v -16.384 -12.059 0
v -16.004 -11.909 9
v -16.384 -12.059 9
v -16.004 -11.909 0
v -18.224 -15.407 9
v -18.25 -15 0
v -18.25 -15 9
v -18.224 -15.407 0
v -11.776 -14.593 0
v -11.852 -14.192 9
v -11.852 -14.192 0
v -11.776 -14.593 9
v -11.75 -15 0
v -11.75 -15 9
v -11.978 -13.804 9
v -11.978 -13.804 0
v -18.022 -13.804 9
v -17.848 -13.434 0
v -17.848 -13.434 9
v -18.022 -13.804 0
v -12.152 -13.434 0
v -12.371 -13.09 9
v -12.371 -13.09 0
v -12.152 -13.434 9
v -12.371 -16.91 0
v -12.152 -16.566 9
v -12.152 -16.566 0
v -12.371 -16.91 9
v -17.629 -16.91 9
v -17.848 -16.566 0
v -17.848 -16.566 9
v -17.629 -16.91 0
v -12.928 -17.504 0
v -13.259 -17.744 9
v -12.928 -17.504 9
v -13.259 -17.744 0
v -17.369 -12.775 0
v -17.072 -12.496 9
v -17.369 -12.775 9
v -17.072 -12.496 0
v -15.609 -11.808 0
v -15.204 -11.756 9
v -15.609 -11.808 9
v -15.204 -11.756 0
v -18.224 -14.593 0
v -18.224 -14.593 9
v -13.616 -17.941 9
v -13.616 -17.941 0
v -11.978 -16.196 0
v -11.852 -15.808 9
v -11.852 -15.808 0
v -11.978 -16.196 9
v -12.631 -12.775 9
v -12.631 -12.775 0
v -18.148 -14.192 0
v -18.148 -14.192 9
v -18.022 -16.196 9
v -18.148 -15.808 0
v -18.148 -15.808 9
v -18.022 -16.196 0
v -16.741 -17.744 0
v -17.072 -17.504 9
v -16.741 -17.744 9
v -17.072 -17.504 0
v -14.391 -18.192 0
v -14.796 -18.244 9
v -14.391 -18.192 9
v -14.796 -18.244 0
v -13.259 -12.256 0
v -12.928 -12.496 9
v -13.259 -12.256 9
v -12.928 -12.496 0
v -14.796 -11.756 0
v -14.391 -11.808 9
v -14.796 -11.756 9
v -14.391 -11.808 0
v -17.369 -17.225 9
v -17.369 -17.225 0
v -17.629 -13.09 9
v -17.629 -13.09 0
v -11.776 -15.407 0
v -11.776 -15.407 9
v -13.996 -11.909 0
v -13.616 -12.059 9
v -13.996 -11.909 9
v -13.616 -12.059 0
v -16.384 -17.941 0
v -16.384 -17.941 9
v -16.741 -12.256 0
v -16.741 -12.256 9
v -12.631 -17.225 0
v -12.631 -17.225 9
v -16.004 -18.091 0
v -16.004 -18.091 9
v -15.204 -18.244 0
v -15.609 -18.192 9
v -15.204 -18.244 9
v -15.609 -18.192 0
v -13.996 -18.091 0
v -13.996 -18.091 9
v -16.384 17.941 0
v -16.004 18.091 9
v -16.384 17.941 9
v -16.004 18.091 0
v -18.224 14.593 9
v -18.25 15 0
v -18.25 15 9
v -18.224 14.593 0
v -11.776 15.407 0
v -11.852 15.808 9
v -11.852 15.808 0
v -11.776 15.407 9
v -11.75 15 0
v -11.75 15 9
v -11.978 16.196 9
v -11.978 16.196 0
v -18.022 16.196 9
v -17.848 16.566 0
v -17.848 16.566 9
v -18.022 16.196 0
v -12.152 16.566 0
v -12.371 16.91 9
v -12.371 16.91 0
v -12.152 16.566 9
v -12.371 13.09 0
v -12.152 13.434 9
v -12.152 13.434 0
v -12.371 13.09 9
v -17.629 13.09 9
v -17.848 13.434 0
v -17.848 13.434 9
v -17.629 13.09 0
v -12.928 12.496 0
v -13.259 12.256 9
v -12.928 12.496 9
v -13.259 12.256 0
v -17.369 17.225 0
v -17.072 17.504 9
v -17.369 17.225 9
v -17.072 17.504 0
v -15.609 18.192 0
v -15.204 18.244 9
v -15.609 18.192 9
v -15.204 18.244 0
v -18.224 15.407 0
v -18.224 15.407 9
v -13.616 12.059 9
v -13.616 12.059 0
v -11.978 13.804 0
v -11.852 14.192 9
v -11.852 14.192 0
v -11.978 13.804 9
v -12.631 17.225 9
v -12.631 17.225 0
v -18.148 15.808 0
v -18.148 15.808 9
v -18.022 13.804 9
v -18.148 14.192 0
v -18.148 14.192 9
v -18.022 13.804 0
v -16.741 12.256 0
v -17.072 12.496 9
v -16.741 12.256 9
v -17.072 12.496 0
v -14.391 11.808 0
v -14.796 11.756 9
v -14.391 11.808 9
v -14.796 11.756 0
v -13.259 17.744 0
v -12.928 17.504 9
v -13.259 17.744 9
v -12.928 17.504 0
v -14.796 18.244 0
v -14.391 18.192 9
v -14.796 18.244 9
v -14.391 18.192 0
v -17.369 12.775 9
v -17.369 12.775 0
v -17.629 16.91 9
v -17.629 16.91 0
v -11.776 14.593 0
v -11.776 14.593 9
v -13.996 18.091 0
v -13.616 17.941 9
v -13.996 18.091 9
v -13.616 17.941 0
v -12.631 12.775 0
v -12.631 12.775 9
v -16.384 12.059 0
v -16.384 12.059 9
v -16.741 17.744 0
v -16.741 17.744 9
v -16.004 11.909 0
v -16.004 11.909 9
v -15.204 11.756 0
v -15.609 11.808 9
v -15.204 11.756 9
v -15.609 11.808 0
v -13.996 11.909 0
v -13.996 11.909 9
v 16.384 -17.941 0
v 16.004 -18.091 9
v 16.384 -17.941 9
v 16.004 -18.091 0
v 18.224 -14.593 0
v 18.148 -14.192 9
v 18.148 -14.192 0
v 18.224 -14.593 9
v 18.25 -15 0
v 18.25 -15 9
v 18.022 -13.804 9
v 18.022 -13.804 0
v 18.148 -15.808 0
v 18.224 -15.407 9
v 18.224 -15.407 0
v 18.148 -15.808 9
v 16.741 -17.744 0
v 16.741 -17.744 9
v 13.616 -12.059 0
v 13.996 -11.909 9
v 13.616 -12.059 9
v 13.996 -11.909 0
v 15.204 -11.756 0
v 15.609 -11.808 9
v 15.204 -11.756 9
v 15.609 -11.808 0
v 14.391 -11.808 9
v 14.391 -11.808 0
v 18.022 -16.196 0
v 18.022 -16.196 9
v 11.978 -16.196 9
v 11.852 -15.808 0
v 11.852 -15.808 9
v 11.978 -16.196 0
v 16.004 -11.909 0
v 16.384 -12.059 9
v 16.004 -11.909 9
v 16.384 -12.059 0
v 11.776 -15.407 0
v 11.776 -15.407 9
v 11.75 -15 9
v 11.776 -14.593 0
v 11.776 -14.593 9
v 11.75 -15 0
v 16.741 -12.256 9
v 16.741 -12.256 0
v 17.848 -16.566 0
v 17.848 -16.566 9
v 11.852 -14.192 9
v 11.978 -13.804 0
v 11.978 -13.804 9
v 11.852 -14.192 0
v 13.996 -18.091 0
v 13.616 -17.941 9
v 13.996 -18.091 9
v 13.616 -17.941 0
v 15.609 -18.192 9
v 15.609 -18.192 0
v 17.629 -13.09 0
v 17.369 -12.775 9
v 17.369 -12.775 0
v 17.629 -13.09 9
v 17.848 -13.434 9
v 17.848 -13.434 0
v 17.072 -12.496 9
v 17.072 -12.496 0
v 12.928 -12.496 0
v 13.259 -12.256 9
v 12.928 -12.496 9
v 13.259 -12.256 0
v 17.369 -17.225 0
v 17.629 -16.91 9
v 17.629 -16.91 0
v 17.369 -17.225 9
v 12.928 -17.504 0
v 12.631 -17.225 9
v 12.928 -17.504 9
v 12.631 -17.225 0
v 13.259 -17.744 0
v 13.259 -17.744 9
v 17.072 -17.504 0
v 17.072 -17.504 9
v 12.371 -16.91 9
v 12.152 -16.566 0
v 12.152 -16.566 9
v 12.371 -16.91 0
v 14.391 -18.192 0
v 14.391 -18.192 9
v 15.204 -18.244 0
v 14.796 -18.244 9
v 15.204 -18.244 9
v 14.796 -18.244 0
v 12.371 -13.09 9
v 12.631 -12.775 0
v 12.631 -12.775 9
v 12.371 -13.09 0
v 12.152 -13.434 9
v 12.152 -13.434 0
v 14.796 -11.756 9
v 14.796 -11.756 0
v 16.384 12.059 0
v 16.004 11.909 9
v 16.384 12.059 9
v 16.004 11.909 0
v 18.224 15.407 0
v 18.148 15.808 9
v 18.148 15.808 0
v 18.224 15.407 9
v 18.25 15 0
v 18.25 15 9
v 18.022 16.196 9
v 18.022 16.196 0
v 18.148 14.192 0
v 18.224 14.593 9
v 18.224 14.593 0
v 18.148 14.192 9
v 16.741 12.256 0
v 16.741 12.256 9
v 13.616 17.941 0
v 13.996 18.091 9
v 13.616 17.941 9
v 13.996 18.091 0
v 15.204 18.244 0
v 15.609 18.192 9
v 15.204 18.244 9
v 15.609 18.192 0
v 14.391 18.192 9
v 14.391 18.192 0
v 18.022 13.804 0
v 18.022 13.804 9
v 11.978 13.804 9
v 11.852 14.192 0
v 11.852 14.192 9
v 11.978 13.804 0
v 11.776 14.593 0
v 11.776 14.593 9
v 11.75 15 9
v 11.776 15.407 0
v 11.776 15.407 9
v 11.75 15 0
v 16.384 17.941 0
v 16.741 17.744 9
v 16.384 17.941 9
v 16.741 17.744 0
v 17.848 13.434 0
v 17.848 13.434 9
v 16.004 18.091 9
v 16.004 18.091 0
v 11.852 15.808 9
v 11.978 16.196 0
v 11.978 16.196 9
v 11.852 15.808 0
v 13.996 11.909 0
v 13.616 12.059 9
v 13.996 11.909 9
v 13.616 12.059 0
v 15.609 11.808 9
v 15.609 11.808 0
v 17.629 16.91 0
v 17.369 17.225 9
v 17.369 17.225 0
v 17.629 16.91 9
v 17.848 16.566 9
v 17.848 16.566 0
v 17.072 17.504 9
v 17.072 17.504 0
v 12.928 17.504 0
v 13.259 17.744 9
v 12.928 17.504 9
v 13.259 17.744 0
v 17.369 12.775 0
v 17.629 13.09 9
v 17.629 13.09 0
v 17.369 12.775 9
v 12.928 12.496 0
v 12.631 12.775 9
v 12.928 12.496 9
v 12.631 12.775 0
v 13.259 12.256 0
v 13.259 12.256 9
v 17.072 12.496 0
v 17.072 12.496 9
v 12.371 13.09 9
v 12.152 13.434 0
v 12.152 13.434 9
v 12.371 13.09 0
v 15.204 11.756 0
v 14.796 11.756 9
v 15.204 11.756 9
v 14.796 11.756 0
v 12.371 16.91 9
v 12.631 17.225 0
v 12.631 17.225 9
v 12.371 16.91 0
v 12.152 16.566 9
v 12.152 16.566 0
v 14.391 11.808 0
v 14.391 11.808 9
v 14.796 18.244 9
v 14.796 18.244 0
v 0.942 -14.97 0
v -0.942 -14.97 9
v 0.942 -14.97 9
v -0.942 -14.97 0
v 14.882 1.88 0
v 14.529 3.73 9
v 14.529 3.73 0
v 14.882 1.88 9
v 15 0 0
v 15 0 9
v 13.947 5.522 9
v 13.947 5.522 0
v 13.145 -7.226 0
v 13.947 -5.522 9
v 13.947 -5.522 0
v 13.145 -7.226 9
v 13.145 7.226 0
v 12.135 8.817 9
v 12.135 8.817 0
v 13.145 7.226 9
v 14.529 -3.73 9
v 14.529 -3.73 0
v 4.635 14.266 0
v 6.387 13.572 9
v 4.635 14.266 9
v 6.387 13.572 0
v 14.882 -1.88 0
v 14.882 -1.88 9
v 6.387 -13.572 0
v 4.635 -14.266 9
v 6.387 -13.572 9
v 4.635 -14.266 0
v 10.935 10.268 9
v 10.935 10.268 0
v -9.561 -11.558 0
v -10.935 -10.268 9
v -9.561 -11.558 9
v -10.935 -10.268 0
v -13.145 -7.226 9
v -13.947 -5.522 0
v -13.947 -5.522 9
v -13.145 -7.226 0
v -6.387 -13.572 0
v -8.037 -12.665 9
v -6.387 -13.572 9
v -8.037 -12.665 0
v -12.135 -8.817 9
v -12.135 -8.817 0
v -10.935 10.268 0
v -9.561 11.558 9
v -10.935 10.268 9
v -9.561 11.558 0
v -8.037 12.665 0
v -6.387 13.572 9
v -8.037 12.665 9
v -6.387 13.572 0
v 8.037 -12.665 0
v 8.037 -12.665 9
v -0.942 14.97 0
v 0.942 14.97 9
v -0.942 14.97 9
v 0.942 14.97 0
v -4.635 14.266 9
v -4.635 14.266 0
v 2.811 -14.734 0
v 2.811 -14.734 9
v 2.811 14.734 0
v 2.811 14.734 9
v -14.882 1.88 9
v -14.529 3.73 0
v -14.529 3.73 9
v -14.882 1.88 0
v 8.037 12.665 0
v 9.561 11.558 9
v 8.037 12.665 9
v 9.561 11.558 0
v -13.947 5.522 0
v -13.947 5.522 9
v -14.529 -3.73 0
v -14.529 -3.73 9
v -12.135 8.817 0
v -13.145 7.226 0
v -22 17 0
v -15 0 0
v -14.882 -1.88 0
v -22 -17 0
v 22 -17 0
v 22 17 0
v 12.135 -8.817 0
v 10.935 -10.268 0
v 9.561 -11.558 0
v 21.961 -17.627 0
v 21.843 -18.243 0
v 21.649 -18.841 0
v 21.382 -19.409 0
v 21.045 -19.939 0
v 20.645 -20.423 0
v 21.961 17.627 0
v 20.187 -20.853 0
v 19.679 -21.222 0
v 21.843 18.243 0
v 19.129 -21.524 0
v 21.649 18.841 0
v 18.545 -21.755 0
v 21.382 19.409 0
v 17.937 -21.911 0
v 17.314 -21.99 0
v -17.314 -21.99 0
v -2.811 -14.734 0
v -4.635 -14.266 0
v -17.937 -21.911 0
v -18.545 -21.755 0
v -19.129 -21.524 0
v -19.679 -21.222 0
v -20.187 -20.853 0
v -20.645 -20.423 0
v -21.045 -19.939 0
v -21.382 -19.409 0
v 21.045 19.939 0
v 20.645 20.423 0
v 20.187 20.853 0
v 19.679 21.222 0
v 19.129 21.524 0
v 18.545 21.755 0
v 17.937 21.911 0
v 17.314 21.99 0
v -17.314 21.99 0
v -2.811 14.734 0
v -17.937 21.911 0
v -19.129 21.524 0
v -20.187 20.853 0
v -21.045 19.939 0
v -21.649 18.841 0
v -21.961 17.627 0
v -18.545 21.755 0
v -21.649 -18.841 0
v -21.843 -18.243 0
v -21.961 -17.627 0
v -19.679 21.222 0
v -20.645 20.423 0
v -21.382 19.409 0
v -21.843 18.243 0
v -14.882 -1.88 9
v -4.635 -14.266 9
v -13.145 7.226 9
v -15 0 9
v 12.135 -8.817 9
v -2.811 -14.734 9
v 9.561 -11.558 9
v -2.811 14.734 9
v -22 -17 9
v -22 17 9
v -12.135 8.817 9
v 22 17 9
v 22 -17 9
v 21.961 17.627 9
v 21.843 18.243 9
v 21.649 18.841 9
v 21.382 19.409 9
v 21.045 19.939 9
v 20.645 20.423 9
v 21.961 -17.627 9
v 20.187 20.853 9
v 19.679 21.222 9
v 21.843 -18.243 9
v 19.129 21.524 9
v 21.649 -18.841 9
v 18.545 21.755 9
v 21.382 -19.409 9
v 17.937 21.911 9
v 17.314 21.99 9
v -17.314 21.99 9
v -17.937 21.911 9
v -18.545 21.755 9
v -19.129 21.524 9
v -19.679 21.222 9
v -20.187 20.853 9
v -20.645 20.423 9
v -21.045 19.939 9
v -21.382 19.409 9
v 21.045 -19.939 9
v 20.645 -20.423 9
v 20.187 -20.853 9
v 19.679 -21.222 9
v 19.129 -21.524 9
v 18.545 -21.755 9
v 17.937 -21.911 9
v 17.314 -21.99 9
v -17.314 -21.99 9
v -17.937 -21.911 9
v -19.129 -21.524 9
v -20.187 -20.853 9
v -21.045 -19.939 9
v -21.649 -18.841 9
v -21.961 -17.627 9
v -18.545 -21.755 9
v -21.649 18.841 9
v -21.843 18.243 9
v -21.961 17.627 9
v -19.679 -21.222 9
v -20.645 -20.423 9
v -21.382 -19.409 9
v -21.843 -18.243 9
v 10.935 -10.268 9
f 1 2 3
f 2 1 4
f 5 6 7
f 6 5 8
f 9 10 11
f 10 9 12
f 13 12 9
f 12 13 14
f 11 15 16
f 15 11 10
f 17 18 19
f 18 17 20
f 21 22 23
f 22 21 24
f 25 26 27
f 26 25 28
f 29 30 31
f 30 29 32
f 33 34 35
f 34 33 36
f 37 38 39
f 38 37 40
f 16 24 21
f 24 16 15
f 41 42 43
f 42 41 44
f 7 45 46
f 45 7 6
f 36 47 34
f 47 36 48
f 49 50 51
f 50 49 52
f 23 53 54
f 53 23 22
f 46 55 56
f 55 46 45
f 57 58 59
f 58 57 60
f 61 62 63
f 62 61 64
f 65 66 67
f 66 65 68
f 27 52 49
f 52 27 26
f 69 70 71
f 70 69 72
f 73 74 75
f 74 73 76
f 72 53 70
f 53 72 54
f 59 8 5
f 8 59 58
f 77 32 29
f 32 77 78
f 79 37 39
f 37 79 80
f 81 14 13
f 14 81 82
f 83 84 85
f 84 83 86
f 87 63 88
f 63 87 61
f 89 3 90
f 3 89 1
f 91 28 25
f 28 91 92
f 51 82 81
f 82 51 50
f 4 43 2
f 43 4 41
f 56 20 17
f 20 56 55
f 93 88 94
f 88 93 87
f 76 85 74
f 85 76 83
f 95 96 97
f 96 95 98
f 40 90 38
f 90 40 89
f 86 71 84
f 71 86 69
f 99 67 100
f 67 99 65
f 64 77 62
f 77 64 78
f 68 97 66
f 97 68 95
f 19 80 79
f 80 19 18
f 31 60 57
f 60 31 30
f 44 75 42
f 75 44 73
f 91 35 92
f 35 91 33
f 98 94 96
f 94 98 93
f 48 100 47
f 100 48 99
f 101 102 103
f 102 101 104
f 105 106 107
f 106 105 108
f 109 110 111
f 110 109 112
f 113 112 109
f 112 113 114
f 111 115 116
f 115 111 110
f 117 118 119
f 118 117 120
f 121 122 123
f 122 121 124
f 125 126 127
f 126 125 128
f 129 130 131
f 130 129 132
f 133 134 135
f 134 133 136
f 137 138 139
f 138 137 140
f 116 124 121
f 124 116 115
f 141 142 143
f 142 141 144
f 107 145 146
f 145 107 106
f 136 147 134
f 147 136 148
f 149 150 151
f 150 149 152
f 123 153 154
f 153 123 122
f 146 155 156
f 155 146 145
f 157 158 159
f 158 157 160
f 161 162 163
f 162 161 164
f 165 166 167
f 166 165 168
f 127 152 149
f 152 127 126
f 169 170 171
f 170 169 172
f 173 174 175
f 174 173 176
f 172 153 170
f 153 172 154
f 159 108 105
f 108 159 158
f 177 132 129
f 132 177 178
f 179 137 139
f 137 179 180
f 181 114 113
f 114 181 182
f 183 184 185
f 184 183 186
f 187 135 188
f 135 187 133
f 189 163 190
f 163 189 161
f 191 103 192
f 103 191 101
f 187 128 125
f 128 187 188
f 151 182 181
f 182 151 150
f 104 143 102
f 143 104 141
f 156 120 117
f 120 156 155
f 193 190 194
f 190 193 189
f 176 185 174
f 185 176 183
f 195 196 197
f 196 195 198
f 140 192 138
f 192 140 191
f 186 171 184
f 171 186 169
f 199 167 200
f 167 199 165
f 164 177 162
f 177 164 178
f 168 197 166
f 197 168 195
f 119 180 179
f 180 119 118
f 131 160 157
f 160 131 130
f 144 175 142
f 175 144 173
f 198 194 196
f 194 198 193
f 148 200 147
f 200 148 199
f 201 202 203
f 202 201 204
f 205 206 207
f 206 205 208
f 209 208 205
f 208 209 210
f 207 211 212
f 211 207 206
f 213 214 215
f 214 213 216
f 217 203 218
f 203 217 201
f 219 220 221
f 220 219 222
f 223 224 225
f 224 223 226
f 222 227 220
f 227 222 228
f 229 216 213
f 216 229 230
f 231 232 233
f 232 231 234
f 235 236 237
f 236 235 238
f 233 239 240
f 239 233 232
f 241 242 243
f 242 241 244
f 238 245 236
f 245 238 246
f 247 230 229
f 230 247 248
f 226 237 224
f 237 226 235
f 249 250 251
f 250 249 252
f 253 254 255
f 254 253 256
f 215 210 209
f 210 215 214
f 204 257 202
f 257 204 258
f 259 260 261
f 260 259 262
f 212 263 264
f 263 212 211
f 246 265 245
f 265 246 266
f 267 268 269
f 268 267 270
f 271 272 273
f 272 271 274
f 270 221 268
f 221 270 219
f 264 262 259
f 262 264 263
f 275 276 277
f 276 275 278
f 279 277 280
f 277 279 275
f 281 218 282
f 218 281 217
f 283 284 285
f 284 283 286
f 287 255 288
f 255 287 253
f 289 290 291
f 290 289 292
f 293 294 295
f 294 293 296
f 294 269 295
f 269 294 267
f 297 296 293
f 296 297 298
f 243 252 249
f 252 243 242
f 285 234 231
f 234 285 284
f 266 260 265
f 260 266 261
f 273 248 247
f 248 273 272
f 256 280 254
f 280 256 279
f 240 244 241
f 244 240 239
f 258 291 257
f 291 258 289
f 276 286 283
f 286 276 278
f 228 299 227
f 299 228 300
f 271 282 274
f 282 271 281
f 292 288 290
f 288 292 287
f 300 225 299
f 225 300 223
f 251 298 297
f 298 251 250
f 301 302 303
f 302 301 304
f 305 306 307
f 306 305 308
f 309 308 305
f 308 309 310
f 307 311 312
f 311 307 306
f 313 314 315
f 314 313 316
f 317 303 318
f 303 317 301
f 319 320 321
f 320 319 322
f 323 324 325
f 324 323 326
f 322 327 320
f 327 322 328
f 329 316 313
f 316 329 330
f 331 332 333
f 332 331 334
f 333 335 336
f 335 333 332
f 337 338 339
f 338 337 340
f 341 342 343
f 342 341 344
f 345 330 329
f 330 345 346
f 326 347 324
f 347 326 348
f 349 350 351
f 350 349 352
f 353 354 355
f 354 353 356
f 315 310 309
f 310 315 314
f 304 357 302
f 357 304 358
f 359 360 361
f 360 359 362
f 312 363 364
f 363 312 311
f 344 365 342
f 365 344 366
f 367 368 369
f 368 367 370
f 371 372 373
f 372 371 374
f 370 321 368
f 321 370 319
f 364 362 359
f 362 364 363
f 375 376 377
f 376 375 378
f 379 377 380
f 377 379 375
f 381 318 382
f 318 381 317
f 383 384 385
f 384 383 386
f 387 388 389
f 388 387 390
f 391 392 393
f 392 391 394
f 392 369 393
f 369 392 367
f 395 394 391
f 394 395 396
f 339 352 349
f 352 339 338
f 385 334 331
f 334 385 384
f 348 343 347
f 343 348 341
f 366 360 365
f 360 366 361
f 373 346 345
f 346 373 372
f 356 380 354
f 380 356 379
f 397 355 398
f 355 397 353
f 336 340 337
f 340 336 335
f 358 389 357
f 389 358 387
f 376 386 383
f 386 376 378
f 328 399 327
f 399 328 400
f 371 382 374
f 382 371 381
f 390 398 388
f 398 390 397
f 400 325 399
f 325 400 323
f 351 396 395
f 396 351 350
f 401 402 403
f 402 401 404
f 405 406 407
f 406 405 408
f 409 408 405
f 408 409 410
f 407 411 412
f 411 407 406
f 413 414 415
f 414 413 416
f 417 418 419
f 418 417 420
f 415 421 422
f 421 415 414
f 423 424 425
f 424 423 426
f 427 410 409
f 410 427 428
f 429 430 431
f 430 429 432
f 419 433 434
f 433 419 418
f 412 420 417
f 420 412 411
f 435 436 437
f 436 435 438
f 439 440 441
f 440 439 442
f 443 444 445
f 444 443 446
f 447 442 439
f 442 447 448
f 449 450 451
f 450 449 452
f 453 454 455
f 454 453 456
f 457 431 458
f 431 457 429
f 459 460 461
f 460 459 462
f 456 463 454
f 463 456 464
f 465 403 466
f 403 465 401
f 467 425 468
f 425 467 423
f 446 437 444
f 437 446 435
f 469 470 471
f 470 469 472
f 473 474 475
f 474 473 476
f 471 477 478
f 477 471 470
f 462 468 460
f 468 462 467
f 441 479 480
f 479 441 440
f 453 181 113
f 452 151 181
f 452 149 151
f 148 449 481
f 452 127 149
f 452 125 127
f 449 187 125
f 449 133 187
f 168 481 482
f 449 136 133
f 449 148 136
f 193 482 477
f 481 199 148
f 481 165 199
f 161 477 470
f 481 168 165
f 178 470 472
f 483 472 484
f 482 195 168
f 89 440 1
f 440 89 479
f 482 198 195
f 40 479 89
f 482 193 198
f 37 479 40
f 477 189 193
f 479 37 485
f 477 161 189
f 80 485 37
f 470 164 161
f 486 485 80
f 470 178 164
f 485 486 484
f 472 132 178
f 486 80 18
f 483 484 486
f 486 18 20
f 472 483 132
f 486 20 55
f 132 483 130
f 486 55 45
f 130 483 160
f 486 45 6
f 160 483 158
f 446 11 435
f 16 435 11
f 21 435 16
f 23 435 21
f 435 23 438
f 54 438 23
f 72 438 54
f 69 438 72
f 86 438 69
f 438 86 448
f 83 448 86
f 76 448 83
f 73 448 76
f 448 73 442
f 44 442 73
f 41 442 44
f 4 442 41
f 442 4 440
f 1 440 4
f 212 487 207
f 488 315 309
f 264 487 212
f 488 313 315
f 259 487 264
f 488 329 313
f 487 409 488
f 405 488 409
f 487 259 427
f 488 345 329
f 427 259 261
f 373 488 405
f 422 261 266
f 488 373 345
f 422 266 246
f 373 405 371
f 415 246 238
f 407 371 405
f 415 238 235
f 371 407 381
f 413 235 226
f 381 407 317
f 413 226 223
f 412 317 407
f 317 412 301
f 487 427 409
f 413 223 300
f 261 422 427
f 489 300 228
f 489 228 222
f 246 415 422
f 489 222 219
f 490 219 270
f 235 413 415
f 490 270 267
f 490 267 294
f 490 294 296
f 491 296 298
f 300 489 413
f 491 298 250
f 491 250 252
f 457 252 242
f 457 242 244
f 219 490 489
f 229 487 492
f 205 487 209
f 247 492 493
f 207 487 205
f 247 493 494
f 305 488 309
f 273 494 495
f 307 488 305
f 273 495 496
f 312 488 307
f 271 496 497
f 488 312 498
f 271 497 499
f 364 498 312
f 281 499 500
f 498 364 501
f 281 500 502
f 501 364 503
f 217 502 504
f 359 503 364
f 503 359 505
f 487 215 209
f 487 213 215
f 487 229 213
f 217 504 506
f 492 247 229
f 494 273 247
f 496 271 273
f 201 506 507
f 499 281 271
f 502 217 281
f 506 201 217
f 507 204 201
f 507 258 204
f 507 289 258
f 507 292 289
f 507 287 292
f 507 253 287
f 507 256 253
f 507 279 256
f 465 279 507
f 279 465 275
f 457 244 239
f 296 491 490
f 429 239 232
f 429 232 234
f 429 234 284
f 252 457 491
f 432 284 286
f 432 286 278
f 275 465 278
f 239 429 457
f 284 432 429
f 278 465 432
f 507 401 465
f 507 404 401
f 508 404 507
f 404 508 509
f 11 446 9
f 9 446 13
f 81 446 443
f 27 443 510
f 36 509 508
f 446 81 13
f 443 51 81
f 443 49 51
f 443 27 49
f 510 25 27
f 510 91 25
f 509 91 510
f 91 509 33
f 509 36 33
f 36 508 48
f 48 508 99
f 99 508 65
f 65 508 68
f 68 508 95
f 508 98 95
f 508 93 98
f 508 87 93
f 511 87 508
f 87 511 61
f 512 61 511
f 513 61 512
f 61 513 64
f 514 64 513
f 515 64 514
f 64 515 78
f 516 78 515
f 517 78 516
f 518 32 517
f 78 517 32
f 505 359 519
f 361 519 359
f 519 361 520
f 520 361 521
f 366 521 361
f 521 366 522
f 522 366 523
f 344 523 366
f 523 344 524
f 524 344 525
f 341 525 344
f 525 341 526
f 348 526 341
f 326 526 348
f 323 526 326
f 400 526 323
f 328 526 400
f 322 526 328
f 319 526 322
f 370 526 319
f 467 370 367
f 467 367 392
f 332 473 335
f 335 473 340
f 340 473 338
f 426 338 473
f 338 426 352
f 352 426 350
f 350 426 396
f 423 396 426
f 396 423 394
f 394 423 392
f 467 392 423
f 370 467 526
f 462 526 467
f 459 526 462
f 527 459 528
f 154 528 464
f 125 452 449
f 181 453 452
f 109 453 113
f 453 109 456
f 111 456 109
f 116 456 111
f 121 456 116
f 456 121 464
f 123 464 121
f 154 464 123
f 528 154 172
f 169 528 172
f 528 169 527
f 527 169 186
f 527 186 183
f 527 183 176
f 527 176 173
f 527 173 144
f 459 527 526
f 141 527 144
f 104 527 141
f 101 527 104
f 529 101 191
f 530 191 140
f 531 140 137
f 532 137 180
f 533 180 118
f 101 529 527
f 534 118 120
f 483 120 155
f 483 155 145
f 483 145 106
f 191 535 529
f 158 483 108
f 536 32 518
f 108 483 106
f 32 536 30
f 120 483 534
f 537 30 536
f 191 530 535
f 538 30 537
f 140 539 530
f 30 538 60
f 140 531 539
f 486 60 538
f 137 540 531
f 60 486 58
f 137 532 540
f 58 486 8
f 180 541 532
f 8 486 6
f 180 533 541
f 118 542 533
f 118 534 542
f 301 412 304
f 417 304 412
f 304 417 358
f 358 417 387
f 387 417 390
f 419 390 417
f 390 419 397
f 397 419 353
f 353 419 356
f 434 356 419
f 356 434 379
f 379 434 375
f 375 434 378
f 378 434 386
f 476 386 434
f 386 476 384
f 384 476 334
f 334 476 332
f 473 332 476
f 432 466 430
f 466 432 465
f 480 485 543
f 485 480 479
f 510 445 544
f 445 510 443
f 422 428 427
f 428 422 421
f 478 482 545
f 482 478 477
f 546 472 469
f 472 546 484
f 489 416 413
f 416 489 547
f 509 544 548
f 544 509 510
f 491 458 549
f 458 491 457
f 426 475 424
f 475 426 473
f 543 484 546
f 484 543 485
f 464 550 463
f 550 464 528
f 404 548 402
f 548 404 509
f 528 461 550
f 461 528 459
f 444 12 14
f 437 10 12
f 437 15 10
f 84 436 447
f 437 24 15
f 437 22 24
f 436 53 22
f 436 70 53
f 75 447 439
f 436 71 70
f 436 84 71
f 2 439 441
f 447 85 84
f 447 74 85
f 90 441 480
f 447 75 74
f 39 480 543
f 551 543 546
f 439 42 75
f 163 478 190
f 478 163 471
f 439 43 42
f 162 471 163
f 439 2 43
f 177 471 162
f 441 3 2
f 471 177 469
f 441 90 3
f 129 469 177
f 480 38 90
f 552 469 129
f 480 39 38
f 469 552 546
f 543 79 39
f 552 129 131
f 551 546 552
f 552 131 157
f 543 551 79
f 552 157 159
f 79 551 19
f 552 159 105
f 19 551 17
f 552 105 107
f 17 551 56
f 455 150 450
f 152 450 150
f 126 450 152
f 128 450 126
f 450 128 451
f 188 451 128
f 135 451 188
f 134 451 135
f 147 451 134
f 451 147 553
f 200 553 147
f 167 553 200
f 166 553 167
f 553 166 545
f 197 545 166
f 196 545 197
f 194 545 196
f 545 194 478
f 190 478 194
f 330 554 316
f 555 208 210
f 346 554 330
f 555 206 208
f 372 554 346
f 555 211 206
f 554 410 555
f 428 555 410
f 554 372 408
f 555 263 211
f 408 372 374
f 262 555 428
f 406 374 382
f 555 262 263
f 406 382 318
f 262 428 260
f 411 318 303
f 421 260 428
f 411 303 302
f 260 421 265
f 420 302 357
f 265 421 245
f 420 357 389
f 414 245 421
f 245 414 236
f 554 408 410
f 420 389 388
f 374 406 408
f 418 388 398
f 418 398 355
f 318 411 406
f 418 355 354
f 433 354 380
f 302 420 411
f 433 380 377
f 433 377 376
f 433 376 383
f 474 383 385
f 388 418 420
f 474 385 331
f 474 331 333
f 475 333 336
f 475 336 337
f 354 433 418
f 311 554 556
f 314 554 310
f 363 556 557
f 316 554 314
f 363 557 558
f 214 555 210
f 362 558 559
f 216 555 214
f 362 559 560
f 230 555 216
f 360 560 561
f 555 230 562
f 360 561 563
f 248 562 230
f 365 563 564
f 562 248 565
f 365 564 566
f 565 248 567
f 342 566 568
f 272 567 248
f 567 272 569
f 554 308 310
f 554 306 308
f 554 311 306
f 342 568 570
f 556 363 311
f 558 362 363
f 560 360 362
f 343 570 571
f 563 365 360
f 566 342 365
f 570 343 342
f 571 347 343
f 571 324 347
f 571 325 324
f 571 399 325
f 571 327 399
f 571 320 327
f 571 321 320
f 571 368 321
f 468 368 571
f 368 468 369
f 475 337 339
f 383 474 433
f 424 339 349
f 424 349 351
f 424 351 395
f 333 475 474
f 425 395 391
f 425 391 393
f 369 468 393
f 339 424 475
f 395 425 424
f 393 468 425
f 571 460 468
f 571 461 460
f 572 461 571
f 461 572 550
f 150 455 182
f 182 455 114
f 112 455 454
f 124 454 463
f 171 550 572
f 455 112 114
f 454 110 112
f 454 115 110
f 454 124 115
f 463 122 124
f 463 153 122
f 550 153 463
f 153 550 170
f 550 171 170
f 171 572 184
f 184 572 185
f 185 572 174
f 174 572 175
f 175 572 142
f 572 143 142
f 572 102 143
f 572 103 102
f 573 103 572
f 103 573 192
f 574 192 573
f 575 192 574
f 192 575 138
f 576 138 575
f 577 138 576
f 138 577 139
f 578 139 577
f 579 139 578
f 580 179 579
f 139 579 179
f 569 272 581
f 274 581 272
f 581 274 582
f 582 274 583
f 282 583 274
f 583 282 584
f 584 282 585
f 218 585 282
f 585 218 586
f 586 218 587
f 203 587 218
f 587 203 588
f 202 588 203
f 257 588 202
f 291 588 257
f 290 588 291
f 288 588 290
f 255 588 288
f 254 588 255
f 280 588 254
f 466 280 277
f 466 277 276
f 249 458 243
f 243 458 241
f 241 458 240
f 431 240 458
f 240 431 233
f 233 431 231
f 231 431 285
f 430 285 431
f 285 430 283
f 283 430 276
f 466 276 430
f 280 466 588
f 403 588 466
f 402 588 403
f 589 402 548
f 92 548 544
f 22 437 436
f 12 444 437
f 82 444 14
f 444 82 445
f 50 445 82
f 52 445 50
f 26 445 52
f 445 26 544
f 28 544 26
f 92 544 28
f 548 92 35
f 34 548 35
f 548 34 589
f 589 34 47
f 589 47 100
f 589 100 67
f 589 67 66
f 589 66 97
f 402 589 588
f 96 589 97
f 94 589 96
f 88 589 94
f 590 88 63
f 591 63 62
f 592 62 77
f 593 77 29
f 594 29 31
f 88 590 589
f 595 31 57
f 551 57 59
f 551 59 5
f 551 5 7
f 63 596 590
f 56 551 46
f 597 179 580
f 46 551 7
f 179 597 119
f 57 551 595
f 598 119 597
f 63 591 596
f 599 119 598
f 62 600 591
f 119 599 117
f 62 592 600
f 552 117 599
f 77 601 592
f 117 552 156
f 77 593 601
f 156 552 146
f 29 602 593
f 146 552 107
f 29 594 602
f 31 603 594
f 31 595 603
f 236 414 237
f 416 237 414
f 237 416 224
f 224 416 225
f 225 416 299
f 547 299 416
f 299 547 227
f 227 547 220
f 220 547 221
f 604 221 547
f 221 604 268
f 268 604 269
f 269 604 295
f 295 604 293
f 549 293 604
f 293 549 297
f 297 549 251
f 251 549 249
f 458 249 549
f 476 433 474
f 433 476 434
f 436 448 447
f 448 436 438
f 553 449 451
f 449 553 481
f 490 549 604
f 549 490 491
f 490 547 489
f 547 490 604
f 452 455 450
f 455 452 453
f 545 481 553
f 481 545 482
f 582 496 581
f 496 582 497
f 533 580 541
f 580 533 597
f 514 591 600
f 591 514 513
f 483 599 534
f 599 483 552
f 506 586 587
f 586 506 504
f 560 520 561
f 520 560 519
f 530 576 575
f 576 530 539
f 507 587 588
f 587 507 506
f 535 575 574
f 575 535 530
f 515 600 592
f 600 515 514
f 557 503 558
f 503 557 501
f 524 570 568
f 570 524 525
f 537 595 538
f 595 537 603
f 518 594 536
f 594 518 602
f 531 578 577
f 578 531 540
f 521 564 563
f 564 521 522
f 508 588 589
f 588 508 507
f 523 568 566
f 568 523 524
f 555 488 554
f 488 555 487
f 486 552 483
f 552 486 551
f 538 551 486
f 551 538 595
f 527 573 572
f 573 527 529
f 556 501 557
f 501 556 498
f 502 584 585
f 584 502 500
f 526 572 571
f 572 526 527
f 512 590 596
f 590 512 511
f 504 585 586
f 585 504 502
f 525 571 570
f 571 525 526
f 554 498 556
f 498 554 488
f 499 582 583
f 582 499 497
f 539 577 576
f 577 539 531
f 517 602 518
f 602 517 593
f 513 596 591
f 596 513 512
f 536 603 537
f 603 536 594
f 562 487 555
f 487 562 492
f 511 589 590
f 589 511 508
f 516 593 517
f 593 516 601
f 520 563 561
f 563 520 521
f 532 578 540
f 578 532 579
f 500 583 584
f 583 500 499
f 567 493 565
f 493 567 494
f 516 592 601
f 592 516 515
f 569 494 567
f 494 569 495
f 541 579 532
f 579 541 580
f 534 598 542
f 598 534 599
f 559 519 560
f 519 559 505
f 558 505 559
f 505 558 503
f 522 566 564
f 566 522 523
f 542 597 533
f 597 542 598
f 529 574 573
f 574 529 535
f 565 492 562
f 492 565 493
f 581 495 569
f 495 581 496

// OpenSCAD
$fn = 50;

difference() {
	union() {
		hull() {
			translate(v = [-17.0, 17.0, 0]) {
				cylinder(h = 9, r = 5);
			}
			translate(v = [17.0, 17.0, 0]) {
				cylinder(h = 9, r = 5);
			}
			translate(v = [-17.0, -17.0, 0]) {
				cylinder(h = 9, r = 5);
			}
			translate(v = [17.0, -17.0, 0]) {
				cylinder(h = 9, r = 5);
			}
		}
	}
	union() {
		translate(v = [-15.0, -15.0, -100.0]) {
			cylinder(h = 200, r = 3.25);
		}
		translate(v = [-15.0, 15.0, -100.0]) {
			cylinder(h = 200, r = 3.25);
		}
		translate(v = [15.0, -15.0, -100.0]) {
			cylinder(h = 200, r = 3.25);
		}
		translate(v = [15.0, 15.0, -100.0]) {
			cylinder(h = 200, r = 3.25);
		}
		translate(v = [-15.0, -15.0, -100.0]) {
			cylinder(h = 200, r = 1.8);
		}
		translate(v = [-15.0, 15.0, -100.0]) {
			cylinder(h = 200, r = 1.8);
		}
		translate(v = [15.0, -15.0, -100.0]) {
			cylinder(h = 200, r = 1.8);
		}
		translate(v = [15.0, 15.0, -100.0]) {
			cylinder(h = 200, r = 1.8);
		}
		cylinder(h = 9, r = 15.0);
	}
}
